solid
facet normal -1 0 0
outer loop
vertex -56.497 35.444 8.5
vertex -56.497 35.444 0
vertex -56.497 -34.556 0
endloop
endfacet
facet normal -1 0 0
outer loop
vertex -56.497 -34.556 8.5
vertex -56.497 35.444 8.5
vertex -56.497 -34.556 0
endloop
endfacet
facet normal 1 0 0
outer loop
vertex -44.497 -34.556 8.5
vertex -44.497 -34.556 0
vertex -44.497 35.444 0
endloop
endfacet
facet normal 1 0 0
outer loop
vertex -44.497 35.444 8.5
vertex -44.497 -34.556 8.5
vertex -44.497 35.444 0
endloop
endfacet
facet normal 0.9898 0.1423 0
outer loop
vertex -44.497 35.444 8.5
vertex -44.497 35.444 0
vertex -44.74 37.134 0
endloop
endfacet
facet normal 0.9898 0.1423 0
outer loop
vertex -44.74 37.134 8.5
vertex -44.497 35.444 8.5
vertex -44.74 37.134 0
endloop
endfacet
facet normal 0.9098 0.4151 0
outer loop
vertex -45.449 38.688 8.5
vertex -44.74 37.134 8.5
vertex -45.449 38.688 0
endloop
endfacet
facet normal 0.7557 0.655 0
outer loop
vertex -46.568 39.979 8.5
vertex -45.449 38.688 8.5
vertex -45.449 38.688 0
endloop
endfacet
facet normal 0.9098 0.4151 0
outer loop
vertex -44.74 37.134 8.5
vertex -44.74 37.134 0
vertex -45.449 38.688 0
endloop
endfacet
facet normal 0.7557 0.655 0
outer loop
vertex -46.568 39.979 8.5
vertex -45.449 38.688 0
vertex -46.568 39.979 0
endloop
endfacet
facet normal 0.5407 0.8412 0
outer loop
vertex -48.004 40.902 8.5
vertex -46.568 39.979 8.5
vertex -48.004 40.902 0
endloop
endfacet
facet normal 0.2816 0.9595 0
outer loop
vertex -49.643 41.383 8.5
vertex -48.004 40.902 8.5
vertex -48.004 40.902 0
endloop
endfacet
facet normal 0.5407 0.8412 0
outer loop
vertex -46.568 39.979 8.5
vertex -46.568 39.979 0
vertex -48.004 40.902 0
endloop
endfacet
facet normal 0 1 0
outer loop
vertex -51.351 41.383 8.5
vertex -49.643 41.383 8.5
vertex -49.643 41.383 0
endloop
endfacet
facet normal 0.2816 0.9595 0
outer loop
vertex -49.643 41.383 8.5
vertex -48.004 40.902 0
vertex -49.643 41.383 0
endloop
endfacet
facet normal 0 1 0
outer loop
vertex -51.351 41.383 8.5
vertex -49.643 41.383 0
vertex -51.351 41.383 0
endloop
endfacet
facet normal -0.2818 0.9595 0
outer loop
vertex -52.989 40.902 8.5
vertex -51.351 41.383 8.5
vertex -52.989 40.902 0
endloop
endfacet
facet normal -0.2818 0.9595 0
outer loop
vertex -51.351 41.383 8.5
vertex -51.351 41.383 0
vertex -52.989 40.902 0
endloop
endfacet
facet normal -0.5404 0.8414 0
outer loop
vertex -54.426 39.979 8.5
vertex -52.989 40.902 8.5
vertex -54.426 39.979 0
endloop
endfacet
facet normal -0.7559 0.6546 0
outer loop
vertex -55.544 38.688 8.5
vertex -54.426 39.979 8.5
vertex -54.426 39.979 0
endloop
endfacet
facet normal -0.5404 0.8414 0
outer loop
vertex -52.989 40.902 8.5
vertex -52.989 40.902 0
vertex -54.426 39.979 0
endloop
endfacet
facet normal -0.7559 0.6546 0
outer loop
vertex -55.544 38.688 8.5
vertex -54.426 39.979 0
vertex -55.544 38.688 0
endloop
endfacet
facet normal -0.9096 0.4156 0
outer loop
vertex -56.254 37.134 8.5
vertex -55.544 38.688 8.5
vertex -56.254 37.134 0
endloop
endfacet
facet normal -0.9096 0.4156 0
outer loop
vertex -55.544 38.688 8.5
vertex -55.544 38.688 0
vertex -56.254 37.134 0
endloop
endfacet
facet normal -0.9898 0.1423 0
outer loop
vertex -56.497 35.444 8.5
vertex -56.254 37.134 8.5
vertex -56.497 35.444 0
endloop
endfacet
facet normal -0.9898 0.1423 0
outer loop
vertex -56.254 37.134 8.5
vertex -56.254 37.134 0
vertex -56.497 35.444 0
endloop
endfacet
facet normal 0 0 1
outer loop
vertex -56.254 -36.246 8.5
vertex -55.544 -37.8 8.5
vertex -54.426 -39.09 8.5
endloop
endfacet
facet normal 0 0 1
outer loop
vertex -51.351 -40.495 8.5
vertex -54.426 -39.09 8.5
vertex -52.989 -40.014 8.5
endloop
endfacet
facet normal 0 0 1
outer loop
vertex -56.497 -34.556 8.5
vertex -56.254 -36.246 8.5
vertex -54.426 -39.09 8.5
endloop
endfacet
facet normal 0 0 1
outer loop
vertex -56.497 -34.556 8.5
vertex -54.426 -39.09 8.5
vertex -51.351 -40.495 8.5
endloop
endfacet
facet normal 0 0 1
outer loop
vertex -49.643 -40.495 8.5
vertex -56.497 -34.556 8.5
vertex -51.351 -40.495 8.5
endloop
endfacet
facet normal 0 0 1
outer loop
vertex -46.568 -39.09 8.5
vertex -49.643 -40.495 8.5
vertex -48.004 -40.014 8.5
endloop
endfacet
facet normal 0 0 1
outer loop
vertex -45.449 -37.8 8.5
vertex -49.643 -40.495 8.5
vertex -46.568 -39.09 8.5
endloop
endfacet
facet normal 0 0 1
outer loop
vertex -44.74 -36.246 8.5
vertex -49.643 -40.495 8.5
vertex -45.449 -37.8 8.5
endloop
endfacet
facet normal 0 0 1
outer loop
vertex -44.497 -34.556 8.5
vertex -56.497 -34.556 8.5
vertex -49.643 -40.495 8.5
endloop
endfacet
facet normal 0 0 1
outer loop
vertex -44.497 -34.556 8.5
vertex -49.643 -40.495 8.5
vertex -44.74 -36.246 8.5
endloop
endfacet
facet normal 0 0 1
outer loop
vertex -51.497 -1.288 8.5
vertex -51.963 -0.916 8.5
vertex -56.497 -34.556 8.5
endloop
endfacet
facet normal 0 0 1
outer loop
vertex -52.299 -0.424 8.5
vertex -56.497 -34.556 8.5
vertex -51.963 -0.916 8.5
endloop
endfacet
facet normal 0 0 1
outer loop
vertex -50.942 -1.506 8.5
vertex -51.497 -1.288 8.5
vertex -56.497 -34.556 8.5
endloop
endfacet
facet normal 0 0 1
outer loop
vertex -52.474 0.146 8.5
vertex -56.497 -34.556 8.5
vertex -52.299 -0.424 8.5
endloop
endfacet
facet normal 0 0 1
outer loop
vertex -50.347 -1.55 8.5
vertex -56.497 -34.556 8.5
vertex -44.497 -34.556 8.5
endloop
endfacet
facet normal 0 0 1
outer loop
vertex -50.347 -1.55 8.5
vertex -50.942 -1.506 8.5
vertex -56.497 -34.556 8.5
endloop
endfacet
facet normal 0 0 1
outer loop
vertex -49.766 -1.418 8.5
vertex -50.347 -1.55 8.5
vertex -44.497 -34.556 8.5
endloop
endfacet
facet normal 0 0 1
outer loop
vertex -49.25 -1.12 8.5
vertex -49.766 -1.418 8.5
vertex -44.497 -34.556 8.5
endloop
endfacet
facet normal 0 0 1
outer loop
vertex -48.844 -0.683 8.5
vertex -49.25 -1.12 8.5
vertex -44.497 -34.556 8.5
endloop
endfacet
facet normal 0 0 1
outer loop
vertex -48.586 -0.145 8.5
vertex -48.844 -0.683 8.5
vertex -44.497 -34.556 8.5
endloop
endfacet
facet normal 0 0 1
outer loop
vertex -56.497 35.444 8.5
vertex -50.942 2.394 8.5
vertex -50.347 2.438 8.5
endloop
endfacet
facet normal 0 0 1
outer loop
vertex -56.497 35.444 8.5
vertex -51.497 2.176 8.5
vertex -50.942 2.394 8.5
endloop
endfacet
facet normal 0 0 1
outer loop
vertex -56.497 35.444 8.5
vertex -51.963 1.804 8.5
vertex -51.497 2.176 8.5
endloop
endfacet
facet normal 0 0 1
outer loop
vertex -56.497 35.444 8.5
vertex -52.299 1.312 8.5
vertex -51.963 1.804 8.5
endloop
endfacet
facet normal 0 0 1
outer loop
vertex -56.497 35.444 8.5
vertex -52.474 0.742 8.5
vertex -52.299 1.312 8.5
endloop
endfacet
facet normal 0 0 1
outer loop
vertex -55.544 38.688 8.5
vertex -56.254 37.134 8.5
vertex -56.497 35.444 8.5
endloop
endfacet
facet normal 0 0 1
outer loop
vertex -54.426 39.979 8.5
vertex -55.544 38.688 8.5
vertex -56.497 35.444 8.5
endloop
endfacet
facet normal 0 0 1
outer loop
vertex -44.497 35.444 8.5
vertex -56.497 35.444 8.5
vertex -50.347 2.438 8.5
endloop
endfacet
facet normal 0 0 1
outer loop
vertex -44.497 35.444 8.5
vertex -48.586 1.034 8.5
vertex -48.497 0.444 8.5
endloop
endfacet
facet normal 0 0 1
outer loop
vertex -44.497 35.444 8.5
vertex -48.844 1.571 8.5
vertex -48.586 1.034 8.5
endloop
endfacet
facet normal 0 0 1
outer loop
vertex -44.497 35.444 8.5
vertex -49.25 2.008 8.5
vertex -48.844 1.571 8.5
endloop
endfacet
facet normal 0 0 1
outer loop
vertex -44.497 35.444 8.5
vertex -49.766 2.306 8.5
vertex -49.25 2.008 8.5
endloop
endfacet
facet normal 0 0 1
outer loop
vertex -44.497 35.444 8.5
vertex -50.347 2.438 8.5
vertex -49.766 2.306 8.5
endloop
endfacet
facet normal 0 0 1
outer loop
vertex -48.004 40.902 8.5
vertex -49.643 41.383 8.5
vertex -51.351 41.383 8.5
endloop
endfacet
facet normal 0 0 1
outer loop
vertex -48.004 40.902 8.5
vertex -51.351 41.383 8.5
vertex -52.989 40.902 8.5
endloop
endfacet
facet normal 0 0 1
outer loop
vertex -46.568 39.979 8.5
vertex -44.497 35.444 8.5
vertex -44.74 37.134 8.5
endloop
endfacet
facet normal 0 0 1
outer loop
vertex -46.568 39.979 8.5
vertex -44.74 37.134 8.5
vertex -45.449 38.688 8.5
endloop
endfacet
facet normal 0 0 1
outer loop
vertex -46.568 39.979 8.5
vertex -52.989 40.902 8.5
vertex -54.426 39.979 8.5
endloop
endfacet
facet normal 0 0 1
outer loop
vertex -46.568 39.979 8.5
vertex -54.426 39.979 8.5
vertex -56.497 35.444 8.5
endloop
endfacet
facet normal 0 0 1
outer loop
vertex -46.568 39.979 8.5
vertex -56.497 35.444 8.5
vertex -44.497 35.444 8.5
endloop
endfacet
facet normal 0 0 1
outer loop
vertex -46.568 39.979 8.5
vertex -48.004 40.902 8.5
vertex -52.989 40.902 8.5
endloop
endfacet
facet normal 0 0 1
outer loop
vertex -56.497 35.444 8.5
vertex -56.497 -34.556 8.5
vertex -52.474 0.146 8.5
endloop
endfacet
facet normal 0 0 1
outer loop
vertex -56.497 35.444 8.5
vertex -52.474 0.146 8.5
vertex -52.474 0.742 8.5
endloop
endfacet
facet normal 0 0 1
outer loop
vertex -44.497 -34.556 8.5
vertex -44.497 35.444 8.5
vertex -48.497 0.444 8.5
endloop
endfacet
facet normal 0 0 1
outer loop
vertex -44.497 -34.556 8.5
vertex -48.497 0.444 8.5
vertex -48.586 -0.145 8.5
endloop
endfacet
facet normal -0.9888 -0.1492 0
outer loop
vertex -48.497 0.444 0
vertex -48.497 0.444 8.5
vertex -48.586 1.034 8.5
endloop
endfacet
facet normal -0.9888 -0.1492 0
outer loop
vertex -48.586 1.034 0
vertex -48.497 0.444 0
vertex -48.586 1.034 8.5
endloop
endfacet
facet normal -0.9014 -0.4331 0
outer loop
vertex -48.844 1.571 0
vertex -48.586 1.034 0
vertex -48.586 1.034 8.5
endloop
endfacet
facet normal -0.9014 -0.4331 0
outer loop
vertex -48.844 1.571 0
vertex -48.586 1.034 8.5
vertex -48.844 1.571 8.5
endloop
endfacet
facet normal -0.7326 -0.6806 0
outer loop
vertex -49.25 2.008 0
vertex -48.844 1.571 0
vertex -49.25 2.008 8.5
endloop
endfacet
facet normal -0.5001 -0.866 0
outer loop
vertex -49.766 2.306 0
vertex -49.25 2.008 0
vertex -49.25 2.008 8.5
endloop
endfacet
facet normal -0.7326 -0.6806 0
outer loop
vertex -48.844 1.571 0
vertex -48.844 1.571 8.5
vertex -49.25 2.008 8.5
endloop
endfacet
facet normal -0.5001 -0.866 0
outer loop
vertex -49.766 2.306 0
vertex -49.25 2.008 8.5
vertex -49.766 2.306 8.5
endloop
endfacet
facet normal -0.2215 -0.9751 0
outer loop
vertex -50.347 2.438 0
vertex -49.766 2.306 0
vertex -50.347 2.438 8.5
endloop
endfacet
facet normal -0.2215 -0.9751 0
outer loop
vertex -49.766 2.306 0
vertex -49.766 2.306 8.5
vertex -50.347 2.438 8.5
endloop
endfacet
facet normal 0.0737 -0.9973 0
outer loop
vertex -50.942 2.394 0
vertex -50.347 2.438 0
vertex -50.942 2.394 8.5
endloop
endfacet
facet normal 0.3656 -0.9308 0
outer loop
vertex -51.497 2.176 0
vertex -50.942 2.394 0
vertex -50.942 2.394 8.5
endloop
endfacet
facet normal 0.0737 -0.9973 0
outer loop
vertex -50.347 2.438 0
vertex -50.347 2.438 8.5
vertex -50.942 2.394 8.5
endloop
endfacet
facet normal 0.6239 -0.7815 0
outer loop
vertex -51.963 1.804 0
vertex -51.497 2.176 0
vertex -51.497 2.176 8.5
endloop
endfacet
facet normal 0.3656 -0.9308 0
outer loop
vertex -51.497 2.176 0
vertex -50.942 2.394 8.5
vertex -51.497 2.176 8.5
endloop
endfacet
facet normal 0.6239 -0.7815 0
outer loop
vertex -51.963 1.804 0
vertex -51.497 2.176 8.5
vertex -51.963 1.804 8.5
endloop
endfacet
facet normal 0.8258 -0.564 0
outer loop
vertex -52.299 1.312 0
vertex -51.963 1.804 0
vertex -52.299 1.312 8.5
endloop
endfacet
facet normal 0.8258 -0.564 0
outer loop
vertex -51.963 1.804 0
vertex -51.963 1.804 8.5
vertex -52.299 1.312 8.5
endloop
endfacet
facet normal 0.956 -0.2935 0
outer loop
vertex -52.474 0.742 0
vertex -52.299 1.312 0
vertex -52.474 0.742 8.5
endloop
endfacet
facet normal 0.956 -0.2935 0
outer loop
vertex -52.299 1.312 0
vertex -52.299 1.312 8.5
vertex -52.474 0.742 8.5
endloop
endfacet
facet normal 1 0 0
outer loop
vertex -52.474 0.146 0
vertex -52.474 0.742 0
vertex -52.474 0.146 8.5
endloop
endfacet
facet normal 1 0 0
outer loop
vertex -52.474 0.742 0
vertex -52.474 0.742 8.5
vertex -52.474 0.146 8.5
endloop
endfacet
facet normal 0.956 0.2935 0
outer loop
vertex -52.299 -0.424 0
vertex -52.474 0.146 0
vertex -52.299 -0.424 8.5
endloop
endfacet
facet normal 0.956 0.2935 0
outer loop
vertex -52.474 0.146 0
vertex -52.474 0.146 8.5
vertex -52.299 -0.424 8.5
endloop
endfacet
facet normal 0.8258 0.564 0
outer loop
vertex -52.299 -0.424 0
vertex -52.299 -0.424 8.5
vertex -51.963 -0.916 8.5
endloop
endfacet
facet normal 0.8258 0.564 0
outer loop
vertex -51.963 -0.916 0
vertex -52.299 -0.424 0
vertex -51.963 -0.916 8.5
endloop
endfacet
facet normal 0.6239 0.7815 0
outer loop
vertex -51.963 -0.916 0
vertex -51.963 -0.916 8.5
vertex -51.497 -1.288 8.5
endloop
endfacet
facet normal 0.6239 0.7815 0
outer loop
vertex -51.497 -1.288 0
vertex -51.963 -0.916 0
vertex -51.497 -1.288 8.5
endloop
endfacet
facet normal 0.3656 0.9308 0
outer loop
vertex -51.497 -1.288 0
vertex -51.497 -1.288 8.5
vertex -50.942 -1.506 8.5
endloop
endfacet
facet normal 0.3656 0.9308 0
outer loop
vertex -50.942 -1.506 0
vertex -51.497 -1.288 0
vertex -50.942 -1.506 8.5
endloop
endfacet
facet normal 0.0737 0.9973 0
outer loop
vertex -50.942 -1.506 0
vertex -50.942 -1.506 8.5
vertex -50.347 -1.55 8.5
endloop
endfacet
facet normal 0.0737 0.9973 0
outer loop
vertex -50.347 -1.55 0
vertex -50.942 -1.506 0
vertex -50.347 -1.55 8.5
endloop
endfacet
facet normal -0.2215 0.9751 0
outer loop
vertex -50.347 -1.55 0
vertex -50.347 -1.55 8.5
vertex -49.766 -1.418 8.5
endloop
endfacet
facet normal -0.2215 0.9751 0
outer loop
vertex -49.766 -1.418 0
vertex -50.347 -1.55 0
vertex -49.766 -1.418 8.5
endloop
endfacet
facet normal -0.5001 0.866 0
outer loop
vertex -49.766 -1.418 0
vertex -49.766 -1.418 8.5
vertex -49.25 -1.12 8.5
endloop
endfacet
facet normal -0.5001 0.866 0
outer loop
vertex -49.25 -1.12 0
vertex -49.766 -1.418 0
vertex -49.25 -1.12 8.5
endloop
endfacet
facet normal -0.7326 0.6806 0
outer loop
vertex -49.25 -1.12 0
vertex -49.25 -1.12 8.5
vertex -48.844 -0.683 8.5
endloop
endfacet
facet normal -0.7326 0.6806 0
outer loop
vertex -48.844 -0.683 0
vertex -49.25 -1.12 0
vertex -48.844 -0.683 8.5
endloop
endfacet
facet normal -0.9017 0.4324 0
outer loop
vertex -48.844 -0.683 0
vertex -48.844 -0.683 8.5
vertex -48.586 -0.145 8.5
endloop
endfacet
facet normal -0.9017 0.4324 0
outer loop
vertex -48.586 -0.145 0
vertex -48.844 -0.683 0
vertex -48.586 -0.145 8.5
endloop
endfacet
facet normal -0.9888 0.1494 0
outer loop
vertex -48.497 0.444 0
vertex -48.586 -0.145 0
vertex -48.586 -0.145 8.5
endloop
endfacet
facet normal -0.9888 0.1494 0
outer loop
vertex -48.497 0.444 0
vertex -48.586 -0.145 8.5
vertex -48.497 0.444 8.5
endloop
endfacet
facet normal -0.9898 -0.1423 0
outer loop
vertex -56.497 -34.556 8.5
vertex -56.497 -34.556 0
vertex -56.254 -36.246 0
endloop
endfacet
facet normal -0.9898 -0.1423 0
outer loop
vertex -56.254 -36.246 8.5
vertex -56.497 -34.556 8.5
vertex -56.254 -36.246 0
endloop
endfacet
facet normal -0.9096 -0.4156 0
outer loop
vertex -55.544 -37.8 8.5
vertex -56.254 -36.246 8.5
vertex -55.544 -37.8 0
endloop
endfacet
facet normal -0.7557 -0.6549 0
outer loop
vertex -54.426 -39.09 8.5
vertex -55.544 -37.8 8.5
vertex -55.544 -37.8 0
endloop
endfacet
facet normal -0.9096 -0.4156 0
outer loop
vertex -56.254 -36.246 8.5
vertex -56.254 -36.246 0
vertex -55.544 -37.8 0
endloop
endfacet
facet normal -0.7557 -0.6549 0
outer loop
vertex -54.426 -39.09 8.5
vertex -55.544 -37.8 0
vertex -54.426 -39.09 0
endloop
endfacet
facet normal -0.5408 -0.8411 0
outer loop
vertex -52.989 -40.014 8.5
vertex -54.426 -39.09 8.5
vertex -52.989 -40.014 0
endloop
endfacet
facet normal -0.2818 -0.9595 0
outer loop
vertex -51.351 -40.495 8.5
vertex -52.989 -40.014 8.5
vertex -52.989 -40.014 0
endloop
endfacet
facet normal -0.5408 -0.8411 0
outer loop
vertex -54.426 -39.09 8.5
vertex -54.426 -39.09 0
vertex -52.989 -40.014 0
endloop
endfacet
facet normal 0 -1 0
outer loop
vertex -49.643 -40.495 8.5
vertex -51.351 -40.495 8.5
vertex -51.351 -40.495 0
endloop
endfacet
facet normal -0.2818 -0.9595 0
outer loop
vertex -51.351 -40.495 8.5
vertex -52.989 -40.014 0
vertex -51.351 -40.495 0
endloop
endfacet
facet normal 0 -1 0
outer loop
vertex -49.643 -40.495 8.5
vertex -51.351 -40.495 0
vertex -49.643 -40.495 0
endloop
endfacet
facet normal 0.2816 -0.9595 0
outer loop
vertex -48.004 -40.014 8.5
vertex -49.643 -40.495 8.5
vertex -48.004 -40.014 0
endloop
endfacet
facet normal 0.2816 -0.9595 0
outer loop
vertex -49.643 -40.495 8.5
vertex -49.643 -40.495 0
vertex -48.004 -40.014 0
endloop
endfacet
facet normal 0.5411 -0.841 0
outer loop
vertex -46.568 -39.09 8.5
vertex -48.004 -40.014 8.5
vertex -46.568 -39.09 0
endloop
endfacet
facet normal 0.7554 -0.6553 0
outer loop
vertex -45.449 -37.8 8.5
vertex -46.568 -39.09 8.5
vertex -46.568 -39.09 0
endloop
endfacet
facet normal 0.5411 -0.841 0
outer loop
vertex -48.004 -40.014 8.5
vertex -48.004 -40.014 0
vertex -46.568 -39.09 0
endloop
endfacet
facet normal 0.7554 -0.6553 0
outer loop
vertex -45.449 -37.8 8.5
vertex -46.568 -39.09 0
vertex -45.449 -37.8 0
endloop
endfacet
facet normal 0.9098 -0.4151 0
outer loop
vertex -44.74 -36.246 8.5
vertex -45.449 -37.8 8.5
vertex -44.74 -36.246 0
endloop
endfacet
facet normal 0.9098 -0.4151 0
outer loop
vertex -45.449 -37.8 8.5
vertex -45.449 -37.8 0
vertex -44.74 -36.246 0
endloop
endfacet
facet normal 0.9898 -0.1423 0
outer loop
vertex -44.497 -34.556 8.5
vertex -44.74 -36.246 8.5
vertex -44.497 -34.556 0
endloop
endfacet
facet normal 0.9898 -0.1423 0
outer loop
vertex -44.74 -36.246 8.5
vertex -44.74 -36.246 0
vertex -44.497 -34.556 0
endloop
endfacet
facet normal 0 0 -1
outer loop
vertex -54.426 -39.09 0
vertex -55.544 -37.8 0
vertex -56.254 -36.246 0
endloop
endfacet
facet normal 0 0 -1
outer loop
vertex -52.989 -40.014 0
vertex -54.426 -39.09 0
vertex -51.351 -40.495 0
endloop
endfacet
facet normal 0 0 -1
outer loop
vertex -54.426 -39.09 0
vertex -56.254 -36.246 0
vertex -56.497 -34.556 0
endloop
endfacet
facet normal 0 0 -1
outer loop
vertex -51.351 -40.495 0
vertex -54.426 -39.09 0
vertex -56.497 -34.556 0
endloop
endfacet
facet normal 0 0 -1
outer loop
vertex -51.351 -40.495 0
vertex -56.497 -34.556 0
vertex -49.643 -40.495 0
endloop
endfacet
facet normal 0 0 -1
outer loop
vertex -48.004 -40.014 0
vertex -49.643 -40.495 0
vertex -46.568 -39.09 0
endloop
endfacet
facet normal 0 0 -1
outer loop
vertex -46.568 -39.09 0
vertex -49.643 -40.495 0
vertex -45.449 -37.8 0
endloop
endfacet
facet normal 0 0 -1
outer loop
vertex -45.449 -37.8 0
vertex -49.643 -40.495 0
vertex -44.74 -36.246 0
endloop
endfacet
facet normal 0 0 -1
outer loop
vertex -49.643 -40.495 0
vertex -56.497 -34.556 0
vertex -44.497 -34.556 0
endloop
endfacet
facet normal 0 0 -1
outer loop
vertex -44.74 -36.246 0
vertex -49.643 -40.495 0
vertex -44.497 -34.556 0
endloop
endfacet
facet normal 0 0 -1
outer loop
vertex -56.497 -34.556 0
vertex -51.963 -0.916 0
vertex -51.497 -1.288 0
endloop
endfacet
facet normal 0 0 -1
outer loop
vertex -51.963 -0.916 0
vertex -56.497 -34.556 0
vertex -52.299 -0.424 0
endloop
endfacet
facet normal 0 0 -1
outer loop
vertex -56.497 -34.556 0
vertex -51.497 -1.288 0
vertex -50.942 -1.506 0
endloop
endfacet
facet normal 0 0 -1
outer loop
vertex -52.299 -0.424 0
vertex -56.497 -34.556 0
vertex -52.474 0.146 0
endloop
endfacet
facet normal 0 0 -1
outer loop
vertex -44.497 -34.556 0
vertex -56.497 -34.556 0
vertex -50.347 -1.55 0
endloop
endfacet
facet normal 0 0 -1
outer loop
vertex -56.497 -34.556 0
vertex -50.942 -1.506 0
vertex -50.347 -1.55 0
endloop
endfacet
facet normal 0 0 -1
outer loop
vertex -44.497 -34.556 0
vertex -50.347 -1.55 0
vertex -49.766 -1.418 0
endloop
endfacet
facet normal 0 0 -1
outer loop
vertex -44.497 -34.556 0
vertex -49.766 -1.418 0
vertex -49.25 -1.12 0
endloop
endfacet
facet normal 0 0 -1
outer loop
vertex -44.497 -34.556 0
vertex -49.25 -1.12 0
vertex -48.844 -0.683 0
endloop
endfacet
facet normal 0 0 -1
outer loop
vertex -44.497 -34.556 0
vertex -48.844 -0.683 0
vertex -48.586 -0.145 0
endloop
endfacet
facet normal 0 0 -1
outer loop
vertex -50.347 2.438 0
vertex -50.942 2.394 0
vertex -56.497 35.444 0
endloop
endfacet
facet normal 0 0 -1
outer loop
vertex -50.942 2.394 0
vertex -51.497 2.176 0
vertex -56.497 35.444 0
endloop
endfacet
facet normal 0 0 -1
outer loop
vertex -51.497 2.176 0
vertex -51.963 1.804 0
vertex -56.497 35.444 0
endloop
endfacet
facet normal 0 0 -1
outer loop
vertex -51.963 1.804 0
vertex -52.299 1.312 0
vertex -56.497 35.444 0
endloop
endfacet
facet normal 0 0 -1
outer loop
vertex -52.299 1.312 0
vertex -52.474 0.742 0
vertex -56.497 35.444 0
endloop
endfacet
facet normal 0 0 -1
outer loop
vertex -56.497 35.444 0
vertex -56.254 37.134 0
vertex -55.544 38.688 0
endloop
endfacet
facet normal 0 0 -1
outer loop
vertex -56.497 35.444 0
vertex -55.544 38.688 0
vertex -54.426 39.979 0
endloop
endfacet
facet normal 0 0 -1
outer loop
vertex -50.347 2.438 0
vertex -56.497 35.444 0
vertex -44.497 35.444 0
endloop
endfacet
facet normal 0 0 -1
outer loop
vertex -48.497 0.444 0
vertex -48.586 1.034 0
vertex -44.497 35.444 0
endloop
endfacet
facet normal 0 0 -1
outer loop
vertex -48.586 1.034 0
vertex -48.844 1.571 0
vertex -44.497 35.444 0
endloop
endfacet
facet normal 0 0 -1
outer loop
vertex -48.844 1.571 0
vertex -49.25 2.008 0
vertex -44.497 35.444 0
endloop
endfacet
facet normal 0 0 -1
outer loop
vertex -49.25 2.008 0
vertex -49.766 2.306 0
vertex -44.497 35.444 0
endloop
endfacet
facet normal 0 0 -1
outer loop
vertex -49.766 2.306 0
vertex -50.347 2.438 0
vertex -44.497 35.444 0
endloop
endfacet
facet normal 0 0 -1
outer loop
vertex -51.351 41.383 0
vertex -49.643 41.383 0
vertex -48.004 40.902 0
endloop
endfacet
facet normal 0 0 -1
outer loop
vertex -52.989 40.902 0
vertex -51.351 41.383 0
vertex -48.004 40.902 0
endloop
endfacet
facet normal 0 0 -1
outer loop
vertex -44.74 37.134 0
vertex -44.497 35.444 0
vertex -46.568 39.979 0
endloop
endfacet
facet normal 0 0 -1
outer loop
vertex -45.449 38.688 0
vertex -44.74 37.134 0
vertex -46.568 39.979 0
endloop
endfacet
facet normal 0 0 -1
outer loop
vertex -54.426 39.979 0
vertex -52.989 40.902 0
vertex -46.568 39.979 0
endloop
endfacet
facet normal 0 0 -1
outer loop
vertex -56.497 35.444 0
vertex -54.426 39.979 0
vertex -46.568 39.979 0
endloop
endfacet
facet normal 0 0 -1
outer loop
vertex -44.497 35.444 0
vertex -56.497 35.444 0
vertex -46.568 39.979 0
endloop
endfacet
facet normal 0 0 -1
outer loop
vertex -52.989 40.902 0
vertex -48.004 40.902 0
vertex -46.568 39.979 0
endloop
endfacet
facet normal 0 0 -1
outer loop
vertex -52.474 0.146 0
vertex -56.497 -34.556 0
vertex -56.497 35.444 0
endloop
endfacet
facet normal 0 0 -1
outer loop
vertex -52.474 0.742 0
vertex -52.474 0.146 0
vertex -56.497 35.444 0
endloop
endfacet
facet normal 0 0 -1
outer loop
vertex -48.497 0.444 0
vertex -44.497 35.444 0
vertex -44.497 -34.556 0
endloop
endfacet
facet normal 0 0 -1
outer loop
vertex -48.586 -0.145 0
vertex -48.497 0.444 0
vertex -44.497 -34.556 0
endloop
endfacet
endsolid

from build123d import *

# Parameters (mm, degrees)
F1_DEPTH = 8.5
F2_R     = 2
F3_DEPTH = 25


with BuildPart() as f1:
    # F0 (on Top) → F1 (new body)
    with BuildSketch(Plane.XY):
        with BuildLine():
            ThreePointArc((-44.496713, 35.444079), (-50.496713, 41.444079), (-56.496713, 35.444079))
            Line((-56.496713, 35.444079), (-56.496713, -34.555921))
            ThreePointArc((-56.496713, -34.555921), (-50.496713, -40.555921), (-44.496713, -34.555921))
            Line((-44.496713, -34.555921), (-44.496713, 35.444079))
        make_face()
    extrude(amount=F1_DEPTH)

    # F2 (on face) → F3 (cut)
    with BuildSketch(Plane.XY.offset(8.5)):
        with Locations((-50.496713, 0.444079)):
            Circle(F2_R)
    extrude(amount=-F3_DEPTH, mode=Mode.SUBTRACT)


solid = f1.part
